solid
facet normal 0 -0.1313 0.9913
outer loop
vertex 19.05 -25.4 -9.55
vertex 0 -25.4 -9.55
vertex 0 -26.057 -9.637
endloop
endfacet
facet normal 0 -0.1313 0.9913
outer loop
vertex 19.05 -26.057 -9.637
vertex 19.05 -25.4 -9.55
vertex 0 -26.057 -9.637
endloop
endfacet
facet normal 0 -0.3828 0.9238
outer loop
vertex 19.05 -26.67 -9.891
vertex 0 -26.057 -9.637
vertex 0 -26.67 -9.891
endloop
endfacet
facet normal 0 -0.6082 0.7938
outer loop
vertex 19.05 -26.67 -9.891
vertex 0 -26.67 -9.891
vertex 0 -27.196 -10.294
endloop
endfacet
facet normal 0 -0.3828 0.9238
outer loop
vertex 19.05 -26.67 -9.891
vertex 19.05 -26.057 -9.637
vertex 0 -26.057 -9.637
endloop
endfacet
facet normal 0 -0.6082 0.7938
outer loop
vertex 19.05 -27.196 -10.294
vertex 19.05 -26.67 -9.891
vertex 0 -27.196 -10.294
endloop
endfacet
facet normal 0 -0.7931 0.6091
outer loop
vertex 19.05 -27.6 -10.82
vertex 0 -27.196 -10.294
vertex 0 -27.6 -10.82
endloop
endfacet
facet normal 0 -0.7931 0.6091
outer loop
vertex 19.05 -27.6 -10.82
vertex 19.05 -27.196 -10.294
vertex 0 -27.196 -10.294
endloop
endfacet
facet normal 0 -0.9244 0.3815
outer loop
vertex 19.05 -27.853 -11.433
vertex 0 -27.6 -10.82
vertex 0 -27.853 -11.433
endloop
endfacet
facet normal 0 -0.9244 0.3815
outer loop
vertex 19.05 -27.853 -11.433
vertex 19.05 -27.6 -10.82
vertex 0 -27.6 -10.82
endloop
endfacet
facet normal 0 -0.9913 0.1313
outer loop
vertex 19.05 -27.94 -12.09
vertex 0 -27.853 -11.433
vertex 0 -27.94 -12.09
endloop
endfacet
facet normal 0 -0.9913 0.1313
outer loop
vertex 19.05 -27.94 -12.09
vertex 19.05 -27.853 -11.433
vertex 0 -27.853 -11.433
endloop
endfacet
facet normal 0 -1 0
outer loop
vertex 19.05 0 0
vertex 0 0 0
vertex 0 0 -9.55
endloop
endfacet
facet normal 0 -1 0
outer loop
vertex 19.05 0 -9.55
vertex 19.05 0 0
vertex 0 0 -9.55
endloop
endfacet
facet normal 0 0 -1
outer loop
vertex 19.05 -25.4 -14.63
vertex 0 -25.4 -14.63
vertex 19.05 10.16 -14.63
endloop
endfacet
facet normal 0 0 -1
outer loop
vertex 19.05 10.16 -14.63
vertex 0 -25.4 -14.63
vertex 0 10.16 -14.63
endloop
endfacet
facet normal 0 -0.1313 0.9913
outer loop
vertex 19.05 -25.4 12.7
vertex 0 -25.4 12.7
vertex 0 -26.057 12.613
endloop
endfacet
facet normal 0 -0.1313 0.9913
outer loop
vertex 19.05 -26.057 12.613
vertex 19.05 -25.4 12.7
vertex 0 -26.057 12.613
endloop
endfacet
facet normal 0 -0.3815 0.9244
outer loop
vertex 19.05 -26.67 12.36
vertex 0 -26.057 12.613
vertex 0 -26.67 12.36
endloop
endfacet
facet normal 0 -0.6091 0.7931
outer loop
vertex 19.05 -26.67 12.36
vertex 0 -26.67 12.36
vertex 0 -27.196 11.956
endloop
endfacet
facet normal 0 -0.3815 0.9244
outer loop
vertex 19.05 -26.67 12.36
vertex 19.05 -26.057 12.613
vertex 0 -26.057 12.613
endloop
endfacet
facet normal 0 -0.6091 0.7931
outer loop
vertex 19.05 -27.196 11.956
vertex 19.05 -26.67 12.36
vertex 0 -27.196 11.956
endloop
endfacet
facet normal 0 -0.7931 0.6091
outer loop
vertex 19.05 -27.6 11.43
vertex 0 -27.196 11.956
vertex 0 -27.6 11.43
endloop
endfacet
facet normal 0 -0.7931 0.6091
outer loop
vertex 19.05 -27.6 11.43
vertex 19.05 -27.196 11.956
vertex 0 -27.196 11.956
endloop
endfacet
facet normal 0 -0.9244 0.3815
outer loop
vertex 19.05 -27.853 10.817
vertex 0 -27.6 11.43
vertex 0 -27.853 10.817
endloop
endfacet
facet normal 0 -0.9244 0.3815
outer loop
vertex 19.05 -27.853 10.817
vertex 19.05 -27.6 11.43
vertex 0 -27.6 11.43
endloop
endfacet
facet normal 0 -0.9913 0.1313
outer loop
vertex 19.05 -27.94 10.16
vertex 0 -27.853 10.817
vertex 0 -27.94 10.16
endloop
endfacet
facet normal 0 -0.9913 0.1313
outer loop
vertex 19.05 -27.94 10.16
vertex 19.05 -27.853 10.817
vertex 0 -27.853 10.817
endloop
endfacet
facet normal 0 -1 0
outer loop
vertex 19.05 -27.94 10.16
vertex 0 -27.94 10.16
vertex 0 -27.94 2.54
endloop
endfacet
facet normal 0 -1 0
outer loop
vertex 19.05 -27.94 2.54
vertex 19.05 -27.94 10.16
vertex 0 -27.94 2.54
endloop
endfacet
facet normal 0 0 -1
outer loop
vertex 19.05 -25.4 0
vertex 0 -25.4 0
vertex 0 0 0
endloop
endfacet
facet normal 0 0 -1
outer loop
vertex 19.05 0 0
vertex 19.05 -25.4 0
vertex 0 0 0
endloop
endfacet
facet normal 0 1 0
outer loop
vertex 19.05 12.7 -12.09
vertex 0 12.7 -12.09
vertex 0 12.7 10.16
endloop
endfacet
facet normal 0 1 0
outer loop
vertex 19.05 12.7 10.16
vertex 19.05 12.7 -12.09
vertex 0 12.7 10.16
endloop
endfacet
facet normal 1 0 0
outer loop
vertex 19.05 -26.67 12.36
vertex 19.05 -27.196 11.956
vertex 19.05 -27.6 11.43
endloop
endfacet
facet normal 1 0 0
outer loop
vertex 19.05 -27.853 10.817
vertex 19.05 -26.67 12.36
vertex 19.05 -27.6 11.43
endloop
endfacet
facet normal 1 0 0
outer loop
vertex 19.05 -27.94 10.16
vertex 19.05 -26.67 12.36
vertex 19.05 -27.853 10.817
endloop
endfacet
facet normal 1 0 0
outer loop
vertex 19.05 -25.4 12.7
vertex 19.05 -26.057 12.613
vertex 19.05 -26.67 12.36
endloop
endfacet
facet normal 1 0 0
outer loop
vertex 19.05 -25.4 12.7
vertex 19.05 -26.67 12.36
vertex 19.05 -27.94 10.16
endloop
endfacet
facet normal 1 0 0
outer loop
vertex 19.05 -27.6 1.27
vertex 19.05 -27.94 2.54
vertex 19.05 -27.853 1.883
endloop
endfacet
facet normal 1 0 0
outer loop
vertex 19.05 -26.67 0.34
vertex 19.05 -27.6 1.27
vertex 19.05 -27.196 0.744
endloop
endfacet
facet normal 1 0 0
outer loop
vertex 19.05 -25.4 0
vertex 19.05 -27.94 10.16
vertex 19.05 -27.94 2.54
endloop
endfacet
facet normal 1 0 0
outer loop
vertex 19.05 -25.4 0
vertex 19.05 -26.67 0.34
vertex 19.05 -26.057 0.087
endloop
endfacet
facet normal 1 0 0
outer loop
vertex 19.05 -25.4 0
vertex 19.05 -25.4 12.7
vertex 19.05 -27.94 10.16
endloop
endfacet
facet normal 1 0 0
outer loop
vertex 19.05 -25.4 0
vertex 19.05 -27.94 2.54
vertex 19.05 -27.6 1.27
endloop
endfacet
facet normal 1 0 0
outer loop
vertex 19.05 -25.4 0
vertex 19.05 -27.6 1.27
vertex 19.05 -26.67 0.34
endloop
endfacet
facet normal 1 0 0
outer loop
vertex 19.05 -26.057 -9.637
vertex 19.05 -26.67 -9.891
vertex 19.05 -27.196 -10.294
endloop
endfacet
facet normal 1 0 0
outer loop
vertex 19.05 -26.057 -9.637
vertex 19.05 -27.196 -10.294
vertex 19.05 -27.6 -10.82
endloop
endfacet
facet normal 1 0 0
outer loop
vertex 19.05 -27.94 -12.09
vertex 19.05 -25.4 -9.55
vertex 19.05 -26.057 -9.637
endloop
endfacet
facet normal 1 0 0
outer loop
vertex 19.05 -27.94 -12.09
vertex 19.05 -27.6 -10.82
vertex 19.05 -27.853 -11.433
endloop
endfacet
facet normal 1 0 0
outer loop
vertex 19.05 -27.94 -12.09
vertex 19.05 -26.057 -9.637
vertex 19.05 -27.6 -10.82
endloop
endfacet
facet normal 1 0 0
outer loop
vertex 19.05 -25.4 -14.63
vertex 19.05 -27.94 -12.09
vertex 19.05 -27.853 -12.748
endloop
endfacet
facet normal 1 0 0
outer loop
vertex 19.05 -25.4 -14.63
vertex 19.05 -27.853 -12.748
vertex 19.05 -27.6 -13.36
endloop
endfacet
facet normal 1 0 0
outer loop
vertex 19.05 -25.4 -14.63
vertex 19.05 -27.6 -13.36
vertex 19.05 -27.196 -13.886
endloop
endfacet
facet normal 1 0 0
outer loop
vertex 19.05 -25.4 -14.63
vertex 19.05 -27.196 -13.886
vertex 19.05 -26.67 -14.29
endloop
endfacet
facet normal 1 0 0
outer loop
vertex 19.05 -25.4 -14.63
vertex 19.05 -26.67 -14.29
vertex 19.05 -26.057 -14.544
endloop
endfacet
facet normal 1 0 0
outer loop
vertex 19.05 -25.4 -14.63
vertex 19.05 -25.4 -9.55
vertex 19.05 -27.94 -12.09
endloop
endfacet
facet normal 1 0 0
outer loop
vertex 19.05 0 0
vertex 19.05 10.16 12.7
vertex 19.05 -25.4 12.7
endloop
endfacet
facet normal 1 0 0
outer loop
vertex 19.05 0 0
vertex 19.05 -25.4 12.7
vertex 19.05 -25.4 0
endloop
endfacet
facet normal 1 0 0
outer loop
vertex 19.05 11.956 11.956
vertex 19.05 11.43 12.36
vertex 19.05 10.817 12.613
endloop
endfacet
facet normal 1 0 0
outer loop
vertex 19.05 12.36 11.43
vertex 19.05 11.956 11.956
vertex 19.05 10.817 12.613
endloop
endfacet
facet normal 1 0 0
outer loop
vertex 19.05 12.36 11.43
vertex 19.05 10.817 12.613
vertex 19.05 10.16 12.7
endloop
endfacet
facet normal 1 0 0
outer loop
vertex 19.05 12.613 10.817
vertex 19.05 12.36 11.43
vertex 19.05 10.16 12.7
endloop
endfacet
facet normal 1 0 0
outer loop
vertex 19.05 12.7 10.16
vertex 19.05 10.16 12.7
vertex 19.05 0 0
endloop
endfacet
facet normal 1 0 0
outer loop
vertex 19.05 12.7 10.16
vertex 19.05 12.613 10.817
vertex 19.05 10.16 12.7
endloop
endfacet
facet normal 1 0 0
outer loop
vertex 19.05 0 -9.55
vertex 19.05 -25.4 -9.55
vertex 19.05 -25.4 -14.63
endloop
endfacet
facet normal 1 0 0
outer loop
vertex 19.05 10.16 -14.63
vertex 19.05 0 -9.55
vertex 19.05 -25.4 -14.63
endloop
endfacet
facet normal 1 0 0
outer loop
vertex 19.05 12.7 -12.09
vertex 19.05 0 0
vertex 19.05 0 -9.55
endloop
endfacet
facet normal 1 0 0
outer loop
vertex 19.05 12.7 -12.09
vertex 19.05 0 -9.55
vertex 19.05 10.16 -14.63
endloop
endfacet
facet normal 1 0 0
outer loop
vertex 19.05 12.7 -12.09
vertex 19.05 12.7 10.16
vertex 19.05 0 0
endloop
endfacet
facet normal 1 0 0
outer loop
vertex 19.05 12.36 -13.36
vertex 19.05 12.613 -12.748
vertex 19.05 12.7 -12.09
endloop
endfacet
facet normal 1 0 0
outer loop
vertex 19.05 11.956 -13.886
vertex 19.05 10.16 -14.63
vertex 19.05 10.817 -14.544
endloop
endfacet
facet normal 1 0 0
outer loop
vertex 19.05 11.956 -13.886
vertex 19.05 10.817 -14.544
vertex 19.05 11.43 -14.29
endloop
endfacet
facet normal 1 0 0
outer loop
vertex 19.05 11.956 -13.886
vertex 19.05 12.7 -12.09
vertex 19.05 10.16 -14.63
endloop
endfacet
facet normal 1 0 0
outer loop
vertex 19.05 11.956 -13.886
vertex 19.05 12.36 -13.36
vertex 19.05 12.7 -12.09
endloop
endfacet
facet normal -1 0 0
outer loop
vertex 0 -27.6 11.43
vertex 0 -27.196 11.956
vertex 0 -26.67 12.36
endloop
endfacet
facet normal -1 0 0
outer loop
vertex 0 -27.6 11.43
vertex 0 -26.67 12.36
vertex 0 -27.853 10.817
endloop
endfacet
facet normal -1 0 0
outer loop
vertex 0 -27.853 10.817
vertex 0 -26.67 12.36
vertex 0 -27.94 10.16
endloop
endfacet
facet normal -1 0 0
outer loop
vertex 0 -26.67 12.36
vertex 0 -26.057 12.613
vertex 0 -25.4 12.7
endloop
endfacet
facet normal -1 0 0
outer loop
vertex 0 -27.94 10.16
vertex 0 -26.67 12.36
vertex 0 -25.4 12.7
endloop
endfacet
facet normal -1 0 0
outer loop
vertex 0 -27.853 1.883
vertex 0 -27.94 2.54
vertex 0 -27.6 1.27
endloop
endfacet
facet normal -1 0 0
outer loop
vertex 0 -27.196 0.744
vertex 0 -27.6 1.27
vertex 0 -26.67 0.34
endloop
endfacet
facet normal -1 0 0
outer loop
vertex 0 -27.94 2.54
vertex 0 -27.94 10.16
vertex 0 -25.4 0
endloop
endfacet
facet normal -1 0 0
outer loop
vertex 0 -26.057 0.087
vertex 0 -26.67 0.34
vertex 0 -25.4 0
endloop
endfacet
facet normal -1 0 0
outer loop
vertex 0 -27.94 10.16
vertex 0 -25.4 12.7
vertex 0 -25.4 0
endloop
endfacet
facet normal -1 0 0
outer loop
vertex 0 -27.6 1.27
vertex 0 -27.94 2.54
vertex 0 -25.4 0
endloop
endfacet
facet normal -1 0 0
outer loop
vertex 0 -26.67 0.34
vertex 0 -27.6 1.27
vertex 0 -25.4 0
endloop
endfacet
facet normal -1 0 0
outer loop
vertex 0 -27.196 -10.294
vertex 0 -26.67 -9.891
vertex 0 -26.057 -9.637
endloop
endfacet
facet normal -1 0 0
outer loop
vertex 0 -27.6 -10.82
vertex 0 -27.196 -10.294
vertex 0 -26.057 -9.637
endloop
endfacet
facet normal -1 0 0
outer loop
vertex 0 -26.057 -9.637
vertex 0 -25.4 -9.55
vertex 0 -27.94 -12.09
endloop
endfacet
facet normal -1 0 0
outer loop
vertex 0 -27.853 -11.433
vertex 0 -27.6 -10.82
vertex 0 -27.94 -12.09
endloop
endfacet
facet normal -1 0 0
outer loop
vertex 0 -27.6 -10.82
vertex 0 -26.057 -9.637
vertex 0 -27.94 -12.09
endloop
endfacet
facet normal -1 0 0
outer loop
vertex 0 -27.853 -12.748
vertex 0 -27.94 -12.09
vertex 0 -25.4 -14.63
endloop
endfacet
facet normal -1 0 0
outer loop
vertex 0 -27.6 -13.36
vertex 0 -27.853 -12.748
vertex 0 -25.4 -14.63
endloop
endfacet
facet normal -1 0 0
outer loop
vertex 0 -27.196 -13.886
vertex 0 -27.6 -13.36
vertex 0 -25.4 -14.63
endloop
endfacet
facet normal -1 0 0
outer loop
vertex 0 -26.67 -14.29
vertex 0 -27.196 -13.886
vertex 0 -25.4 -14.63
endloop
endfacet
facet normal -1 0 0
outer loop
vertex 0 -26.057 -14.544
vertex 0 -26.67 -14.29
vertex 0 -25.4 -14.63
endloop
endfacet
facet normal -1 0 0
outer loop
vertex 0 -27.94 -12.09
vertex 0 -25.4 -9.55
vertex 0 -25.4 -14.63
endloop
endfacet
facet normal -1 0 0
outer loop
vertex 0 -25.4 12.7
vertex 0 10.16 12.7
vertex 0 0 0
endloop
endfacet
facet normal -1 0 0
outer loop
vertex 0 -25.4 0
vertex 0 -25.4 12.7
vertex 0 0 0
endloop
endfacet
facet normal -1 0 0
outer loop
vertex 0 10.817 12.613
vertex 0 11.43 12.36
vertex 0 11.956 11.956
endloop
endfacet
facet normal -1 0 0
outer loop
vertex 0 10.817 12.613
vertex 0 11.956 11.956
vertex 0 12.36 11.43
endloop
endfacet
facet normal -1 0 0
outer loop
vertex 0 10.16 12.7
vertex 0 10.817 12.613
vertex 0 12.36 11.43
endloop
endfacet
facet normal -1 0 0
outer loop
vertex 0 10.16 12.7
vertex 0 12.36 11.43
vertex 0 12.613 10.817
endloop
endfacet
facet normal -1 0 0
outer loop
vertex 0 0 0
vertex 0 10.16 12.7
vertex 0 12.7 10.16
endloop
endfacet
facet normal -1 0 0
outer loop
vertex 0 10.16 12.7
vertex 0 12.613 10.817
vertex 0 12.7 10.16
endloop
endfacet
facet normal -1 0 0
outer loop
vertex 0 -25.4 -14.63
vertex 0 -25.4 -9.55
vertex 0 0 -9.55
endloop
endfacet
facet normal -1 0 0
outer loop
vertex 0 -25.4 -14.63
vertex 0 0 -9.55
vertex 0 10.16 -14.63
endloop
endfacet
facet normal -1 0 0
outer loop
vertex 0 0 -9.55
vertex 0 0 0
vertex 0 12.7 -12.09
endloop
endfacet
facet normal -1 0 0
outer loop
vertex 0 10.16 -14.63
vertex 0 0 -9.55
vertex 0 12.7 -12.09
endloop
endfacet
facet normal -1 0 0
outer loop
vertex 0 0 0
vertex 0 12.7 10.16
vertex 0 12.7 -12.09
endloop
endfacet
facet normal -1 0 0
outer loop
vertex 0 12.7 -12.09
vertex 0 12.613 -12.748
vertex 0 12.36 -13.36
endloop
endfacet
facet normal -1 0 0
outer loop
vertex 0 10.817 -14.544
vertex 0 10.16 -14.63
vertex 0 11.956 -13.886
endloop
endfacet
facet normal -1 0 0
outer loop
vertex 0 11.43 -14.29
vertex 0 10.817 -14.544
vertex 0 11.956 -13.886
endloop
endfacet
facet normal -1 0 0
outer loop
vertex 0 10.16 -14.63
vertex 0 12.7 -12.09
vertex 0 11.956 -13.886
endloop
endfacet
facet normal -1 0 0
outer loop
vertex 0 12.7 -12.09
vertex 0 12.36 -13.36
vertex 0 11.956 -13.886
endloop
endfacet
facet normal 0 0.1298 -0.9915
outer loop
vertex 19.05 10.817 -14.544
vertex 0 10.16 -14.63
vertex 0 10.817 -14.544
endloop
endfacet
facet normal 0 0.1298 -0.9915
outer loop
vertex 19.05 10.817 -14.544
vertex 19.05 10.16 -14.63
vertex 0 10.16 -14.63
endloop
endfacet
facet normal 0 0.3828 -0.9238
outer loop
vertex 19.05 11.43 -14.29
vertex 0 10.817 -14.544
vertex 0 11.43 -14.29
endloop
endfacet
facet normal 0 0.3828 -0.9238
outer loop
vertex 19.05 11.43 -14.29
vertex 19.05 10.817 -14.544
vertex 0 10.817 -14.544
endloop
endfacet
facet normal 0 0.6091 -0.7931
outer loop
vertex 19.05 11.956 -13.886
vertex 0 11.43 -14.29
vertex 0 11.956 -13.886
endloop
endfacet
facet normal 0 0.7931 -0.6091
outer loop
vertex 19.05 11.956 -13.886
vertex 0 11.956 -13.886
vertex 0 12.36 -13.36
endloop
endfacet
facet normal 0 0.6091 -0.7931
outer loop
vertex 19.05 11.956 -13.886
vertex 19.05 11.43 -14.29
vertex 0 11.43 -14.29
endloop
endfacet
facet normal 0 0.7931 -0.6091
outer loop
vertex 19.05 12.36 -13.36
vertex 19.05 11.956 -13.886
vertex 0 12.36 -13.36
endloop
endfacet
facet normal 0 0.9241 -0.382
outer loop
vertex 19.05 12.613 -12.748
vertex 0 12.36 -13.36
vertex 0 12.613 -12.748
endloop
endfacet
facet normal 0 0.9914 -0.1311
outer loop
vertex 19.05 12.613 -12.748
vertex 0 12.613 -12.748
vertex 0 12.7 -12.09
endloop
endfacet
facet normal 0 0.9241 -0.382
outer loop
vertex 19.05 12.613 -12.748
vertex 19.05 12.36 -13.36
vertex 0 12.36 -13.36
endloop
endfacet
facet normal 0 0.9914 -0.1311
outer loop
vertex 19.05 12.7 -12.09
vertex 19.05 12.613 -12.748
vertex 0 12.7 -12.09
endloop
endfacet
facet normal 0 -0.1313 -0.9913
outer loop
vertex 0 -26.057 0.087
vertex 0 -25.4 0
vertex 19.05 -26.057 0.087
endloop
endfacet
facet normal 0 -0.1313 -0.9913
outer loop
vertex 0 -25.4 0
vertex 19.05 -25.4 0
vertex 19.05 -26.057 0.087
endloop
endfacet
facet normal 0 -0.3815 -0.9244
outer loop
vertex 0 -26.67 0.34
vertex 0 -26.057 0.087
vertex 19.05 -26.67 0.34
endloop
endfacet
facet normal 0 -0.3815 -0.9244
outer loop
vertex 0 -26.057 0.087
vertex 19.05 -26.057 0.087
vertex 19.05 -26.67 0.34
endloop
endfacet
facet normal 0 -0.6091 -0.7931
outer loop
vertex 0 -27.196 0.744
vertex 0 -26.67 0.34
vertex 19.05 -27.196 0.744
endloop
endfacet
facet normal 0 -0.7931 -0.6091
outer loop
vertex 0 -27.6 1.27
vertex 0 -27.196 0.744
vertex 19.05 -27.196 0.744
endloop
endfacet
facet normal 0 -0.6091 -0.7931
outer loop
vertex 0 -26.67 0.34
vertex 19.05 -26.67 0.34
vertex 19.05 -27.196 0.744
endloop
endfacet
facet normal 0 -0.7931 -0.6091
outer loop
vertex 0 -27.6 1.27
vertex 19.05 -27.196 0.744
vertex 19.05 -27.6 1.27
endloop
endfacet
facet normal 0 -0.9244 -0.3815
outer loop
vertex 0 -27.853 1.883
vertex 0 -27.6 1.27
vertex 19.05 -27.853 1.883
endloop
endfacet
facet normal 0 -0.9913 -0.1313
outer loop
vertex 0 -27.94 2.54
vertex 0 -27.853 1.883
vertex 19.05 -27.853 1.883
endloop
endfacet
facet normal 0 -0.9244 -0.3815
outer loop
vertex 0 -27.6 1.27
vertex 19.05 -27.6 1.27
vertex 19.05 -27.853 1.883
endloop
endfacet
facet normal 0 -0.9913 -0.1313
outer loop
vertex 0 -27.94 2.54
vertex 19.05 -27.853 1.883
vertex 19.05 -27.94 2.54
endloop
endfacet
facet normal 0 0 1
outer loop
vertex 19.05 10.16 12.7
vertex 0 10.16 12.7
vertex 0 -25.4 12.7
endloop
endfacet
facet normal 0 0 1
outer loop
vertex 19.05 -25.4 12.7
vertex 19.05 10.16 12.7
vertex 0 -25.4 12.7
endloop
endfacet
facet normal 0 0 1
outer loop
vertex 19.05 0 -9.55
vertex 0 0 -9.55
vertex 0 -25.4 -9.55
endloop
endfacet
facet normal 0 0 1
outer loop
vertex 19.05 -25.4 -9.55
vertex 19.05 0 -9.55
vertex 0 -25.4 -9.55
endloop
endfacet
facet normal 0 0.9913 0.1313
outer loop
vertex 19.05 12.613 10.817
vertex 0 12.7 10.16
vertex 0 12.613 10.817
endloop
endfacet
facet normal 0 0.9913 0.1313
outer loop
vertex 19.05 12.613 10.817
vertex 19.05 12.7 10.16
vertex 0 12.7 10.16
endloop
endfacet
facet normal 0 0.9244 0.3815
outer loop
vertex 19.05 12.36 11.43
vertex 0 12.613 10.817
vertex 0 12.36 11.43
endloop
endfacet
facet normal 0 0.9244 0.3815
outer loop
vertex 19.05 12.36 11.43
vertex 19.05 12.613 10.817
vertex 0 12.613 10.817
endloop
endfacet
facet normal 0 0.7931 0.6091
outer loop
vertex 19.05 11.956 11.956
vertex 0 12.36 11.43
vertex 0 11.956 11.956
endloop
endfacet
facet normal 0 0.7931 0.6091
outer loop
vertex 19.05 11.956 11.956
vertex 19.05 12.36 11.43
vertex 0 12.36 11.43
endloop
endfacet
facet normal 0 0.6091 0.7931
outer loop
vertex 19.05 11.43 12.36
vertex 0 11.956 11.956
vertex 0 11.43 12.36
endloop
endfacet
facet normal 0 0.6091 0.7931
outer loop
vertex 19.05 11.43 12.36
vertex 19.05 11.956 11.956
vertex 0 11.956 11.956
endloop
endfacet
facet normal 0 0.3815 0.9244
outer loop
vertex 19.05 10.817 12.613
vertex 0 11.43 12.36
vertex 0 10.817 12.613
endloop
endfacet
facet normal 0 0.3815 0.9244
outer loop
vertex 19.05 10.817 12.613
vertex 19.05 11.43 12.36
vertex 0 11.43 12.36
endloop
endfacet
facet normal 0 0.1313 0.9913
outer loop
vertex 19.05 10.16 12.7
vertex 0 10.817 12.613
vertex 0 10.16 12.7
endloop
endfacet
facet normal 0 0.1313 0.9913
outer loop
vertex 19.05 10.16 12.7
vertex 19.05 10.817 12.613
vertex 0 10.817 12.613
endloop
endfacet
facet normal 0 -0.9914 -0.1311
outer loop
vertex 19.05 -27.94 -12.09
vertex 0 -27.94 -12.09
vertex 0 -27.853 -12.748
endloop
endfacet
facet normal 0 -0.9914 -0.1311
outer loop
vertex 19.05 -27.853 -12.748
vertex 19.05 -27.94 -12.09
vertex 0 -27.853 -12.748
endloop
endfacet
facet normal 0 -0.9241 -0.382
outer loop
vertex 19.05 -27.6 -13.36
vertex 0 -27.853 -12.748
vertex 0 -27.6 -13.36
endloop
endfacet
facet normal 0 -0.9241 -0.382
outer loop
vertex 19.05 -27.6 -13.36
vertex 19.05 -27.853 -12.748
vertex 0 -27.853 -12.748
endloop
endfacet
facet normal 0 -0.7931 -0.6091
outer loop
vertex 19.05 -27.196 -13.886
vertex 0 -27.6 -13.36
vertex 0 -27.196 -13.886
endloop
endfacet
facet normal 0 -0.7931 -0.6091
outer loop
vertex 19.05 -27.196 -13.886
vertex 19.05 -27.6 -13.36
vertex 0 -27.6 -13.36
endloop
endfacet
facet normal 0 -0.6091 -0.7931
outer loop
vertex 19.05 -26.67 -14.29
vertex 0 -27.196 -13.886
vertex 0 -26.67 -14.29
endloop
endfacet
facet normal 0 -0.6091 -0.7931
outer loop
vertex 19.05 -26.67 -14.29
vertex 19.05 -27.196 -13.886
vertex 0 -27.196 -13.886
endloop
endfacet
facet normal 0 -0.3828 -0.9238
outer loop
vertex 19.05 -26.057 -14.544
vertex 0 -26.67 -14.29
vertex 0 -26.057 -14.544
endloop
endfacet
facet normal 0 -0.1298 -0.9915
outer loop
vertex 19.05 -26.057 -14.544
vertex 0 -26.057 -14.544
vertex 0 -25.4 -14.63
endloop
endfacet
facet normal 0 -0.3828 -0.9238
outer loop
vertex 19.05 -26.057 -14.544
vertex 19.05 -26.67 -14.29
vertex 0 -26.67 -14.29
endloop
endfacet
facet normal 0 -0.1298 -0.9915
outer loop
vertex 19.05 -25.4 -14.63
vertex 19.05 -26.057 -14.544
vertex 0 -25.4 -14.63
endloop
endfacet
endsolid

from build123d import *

# Parameters (mm, degrees)
BOSS_EXTRUDE1_DEPTH = 19.05
FILLET3_R           = 2.54


with BuildPart() as part:
    # Sketch1 → Boss-Extrude1 (new body)
    with BuildSketch(Plane(origin=(0, 0, 0), x_dir=(0, 0, -1), z_dir=(1, 0, 0))):
        Polygon((0, -27.94), (0, 0), (9.5504, 0), (9.5504, -27.94), (14.6304, -27.94), (14.6304, 12.7), (-12.7, 12.7), (-12.7, -27.94), align=None)
    extrude(amount=BOSS_EXTRUDE1_DEPTH)

    # Fillet3
    fillet3_edges = [part.edges().sort_by_distance(p)[0] for p in [
        (9.525, -27.94, 12.7),
        (9.525, 12.7, 12.7),
        (9.525, 12.7, -14.6304),
        (9.525, -27.94, -14.6304),
        (9.525, -27.94, -9.5504),
        (9.525, -27.94, 0),
    ]]
    fillet(fillet3_edges, radius=FILLET3_R - 0.0001)  # a hair under: the kernel refuses the full size


solid = part.part
